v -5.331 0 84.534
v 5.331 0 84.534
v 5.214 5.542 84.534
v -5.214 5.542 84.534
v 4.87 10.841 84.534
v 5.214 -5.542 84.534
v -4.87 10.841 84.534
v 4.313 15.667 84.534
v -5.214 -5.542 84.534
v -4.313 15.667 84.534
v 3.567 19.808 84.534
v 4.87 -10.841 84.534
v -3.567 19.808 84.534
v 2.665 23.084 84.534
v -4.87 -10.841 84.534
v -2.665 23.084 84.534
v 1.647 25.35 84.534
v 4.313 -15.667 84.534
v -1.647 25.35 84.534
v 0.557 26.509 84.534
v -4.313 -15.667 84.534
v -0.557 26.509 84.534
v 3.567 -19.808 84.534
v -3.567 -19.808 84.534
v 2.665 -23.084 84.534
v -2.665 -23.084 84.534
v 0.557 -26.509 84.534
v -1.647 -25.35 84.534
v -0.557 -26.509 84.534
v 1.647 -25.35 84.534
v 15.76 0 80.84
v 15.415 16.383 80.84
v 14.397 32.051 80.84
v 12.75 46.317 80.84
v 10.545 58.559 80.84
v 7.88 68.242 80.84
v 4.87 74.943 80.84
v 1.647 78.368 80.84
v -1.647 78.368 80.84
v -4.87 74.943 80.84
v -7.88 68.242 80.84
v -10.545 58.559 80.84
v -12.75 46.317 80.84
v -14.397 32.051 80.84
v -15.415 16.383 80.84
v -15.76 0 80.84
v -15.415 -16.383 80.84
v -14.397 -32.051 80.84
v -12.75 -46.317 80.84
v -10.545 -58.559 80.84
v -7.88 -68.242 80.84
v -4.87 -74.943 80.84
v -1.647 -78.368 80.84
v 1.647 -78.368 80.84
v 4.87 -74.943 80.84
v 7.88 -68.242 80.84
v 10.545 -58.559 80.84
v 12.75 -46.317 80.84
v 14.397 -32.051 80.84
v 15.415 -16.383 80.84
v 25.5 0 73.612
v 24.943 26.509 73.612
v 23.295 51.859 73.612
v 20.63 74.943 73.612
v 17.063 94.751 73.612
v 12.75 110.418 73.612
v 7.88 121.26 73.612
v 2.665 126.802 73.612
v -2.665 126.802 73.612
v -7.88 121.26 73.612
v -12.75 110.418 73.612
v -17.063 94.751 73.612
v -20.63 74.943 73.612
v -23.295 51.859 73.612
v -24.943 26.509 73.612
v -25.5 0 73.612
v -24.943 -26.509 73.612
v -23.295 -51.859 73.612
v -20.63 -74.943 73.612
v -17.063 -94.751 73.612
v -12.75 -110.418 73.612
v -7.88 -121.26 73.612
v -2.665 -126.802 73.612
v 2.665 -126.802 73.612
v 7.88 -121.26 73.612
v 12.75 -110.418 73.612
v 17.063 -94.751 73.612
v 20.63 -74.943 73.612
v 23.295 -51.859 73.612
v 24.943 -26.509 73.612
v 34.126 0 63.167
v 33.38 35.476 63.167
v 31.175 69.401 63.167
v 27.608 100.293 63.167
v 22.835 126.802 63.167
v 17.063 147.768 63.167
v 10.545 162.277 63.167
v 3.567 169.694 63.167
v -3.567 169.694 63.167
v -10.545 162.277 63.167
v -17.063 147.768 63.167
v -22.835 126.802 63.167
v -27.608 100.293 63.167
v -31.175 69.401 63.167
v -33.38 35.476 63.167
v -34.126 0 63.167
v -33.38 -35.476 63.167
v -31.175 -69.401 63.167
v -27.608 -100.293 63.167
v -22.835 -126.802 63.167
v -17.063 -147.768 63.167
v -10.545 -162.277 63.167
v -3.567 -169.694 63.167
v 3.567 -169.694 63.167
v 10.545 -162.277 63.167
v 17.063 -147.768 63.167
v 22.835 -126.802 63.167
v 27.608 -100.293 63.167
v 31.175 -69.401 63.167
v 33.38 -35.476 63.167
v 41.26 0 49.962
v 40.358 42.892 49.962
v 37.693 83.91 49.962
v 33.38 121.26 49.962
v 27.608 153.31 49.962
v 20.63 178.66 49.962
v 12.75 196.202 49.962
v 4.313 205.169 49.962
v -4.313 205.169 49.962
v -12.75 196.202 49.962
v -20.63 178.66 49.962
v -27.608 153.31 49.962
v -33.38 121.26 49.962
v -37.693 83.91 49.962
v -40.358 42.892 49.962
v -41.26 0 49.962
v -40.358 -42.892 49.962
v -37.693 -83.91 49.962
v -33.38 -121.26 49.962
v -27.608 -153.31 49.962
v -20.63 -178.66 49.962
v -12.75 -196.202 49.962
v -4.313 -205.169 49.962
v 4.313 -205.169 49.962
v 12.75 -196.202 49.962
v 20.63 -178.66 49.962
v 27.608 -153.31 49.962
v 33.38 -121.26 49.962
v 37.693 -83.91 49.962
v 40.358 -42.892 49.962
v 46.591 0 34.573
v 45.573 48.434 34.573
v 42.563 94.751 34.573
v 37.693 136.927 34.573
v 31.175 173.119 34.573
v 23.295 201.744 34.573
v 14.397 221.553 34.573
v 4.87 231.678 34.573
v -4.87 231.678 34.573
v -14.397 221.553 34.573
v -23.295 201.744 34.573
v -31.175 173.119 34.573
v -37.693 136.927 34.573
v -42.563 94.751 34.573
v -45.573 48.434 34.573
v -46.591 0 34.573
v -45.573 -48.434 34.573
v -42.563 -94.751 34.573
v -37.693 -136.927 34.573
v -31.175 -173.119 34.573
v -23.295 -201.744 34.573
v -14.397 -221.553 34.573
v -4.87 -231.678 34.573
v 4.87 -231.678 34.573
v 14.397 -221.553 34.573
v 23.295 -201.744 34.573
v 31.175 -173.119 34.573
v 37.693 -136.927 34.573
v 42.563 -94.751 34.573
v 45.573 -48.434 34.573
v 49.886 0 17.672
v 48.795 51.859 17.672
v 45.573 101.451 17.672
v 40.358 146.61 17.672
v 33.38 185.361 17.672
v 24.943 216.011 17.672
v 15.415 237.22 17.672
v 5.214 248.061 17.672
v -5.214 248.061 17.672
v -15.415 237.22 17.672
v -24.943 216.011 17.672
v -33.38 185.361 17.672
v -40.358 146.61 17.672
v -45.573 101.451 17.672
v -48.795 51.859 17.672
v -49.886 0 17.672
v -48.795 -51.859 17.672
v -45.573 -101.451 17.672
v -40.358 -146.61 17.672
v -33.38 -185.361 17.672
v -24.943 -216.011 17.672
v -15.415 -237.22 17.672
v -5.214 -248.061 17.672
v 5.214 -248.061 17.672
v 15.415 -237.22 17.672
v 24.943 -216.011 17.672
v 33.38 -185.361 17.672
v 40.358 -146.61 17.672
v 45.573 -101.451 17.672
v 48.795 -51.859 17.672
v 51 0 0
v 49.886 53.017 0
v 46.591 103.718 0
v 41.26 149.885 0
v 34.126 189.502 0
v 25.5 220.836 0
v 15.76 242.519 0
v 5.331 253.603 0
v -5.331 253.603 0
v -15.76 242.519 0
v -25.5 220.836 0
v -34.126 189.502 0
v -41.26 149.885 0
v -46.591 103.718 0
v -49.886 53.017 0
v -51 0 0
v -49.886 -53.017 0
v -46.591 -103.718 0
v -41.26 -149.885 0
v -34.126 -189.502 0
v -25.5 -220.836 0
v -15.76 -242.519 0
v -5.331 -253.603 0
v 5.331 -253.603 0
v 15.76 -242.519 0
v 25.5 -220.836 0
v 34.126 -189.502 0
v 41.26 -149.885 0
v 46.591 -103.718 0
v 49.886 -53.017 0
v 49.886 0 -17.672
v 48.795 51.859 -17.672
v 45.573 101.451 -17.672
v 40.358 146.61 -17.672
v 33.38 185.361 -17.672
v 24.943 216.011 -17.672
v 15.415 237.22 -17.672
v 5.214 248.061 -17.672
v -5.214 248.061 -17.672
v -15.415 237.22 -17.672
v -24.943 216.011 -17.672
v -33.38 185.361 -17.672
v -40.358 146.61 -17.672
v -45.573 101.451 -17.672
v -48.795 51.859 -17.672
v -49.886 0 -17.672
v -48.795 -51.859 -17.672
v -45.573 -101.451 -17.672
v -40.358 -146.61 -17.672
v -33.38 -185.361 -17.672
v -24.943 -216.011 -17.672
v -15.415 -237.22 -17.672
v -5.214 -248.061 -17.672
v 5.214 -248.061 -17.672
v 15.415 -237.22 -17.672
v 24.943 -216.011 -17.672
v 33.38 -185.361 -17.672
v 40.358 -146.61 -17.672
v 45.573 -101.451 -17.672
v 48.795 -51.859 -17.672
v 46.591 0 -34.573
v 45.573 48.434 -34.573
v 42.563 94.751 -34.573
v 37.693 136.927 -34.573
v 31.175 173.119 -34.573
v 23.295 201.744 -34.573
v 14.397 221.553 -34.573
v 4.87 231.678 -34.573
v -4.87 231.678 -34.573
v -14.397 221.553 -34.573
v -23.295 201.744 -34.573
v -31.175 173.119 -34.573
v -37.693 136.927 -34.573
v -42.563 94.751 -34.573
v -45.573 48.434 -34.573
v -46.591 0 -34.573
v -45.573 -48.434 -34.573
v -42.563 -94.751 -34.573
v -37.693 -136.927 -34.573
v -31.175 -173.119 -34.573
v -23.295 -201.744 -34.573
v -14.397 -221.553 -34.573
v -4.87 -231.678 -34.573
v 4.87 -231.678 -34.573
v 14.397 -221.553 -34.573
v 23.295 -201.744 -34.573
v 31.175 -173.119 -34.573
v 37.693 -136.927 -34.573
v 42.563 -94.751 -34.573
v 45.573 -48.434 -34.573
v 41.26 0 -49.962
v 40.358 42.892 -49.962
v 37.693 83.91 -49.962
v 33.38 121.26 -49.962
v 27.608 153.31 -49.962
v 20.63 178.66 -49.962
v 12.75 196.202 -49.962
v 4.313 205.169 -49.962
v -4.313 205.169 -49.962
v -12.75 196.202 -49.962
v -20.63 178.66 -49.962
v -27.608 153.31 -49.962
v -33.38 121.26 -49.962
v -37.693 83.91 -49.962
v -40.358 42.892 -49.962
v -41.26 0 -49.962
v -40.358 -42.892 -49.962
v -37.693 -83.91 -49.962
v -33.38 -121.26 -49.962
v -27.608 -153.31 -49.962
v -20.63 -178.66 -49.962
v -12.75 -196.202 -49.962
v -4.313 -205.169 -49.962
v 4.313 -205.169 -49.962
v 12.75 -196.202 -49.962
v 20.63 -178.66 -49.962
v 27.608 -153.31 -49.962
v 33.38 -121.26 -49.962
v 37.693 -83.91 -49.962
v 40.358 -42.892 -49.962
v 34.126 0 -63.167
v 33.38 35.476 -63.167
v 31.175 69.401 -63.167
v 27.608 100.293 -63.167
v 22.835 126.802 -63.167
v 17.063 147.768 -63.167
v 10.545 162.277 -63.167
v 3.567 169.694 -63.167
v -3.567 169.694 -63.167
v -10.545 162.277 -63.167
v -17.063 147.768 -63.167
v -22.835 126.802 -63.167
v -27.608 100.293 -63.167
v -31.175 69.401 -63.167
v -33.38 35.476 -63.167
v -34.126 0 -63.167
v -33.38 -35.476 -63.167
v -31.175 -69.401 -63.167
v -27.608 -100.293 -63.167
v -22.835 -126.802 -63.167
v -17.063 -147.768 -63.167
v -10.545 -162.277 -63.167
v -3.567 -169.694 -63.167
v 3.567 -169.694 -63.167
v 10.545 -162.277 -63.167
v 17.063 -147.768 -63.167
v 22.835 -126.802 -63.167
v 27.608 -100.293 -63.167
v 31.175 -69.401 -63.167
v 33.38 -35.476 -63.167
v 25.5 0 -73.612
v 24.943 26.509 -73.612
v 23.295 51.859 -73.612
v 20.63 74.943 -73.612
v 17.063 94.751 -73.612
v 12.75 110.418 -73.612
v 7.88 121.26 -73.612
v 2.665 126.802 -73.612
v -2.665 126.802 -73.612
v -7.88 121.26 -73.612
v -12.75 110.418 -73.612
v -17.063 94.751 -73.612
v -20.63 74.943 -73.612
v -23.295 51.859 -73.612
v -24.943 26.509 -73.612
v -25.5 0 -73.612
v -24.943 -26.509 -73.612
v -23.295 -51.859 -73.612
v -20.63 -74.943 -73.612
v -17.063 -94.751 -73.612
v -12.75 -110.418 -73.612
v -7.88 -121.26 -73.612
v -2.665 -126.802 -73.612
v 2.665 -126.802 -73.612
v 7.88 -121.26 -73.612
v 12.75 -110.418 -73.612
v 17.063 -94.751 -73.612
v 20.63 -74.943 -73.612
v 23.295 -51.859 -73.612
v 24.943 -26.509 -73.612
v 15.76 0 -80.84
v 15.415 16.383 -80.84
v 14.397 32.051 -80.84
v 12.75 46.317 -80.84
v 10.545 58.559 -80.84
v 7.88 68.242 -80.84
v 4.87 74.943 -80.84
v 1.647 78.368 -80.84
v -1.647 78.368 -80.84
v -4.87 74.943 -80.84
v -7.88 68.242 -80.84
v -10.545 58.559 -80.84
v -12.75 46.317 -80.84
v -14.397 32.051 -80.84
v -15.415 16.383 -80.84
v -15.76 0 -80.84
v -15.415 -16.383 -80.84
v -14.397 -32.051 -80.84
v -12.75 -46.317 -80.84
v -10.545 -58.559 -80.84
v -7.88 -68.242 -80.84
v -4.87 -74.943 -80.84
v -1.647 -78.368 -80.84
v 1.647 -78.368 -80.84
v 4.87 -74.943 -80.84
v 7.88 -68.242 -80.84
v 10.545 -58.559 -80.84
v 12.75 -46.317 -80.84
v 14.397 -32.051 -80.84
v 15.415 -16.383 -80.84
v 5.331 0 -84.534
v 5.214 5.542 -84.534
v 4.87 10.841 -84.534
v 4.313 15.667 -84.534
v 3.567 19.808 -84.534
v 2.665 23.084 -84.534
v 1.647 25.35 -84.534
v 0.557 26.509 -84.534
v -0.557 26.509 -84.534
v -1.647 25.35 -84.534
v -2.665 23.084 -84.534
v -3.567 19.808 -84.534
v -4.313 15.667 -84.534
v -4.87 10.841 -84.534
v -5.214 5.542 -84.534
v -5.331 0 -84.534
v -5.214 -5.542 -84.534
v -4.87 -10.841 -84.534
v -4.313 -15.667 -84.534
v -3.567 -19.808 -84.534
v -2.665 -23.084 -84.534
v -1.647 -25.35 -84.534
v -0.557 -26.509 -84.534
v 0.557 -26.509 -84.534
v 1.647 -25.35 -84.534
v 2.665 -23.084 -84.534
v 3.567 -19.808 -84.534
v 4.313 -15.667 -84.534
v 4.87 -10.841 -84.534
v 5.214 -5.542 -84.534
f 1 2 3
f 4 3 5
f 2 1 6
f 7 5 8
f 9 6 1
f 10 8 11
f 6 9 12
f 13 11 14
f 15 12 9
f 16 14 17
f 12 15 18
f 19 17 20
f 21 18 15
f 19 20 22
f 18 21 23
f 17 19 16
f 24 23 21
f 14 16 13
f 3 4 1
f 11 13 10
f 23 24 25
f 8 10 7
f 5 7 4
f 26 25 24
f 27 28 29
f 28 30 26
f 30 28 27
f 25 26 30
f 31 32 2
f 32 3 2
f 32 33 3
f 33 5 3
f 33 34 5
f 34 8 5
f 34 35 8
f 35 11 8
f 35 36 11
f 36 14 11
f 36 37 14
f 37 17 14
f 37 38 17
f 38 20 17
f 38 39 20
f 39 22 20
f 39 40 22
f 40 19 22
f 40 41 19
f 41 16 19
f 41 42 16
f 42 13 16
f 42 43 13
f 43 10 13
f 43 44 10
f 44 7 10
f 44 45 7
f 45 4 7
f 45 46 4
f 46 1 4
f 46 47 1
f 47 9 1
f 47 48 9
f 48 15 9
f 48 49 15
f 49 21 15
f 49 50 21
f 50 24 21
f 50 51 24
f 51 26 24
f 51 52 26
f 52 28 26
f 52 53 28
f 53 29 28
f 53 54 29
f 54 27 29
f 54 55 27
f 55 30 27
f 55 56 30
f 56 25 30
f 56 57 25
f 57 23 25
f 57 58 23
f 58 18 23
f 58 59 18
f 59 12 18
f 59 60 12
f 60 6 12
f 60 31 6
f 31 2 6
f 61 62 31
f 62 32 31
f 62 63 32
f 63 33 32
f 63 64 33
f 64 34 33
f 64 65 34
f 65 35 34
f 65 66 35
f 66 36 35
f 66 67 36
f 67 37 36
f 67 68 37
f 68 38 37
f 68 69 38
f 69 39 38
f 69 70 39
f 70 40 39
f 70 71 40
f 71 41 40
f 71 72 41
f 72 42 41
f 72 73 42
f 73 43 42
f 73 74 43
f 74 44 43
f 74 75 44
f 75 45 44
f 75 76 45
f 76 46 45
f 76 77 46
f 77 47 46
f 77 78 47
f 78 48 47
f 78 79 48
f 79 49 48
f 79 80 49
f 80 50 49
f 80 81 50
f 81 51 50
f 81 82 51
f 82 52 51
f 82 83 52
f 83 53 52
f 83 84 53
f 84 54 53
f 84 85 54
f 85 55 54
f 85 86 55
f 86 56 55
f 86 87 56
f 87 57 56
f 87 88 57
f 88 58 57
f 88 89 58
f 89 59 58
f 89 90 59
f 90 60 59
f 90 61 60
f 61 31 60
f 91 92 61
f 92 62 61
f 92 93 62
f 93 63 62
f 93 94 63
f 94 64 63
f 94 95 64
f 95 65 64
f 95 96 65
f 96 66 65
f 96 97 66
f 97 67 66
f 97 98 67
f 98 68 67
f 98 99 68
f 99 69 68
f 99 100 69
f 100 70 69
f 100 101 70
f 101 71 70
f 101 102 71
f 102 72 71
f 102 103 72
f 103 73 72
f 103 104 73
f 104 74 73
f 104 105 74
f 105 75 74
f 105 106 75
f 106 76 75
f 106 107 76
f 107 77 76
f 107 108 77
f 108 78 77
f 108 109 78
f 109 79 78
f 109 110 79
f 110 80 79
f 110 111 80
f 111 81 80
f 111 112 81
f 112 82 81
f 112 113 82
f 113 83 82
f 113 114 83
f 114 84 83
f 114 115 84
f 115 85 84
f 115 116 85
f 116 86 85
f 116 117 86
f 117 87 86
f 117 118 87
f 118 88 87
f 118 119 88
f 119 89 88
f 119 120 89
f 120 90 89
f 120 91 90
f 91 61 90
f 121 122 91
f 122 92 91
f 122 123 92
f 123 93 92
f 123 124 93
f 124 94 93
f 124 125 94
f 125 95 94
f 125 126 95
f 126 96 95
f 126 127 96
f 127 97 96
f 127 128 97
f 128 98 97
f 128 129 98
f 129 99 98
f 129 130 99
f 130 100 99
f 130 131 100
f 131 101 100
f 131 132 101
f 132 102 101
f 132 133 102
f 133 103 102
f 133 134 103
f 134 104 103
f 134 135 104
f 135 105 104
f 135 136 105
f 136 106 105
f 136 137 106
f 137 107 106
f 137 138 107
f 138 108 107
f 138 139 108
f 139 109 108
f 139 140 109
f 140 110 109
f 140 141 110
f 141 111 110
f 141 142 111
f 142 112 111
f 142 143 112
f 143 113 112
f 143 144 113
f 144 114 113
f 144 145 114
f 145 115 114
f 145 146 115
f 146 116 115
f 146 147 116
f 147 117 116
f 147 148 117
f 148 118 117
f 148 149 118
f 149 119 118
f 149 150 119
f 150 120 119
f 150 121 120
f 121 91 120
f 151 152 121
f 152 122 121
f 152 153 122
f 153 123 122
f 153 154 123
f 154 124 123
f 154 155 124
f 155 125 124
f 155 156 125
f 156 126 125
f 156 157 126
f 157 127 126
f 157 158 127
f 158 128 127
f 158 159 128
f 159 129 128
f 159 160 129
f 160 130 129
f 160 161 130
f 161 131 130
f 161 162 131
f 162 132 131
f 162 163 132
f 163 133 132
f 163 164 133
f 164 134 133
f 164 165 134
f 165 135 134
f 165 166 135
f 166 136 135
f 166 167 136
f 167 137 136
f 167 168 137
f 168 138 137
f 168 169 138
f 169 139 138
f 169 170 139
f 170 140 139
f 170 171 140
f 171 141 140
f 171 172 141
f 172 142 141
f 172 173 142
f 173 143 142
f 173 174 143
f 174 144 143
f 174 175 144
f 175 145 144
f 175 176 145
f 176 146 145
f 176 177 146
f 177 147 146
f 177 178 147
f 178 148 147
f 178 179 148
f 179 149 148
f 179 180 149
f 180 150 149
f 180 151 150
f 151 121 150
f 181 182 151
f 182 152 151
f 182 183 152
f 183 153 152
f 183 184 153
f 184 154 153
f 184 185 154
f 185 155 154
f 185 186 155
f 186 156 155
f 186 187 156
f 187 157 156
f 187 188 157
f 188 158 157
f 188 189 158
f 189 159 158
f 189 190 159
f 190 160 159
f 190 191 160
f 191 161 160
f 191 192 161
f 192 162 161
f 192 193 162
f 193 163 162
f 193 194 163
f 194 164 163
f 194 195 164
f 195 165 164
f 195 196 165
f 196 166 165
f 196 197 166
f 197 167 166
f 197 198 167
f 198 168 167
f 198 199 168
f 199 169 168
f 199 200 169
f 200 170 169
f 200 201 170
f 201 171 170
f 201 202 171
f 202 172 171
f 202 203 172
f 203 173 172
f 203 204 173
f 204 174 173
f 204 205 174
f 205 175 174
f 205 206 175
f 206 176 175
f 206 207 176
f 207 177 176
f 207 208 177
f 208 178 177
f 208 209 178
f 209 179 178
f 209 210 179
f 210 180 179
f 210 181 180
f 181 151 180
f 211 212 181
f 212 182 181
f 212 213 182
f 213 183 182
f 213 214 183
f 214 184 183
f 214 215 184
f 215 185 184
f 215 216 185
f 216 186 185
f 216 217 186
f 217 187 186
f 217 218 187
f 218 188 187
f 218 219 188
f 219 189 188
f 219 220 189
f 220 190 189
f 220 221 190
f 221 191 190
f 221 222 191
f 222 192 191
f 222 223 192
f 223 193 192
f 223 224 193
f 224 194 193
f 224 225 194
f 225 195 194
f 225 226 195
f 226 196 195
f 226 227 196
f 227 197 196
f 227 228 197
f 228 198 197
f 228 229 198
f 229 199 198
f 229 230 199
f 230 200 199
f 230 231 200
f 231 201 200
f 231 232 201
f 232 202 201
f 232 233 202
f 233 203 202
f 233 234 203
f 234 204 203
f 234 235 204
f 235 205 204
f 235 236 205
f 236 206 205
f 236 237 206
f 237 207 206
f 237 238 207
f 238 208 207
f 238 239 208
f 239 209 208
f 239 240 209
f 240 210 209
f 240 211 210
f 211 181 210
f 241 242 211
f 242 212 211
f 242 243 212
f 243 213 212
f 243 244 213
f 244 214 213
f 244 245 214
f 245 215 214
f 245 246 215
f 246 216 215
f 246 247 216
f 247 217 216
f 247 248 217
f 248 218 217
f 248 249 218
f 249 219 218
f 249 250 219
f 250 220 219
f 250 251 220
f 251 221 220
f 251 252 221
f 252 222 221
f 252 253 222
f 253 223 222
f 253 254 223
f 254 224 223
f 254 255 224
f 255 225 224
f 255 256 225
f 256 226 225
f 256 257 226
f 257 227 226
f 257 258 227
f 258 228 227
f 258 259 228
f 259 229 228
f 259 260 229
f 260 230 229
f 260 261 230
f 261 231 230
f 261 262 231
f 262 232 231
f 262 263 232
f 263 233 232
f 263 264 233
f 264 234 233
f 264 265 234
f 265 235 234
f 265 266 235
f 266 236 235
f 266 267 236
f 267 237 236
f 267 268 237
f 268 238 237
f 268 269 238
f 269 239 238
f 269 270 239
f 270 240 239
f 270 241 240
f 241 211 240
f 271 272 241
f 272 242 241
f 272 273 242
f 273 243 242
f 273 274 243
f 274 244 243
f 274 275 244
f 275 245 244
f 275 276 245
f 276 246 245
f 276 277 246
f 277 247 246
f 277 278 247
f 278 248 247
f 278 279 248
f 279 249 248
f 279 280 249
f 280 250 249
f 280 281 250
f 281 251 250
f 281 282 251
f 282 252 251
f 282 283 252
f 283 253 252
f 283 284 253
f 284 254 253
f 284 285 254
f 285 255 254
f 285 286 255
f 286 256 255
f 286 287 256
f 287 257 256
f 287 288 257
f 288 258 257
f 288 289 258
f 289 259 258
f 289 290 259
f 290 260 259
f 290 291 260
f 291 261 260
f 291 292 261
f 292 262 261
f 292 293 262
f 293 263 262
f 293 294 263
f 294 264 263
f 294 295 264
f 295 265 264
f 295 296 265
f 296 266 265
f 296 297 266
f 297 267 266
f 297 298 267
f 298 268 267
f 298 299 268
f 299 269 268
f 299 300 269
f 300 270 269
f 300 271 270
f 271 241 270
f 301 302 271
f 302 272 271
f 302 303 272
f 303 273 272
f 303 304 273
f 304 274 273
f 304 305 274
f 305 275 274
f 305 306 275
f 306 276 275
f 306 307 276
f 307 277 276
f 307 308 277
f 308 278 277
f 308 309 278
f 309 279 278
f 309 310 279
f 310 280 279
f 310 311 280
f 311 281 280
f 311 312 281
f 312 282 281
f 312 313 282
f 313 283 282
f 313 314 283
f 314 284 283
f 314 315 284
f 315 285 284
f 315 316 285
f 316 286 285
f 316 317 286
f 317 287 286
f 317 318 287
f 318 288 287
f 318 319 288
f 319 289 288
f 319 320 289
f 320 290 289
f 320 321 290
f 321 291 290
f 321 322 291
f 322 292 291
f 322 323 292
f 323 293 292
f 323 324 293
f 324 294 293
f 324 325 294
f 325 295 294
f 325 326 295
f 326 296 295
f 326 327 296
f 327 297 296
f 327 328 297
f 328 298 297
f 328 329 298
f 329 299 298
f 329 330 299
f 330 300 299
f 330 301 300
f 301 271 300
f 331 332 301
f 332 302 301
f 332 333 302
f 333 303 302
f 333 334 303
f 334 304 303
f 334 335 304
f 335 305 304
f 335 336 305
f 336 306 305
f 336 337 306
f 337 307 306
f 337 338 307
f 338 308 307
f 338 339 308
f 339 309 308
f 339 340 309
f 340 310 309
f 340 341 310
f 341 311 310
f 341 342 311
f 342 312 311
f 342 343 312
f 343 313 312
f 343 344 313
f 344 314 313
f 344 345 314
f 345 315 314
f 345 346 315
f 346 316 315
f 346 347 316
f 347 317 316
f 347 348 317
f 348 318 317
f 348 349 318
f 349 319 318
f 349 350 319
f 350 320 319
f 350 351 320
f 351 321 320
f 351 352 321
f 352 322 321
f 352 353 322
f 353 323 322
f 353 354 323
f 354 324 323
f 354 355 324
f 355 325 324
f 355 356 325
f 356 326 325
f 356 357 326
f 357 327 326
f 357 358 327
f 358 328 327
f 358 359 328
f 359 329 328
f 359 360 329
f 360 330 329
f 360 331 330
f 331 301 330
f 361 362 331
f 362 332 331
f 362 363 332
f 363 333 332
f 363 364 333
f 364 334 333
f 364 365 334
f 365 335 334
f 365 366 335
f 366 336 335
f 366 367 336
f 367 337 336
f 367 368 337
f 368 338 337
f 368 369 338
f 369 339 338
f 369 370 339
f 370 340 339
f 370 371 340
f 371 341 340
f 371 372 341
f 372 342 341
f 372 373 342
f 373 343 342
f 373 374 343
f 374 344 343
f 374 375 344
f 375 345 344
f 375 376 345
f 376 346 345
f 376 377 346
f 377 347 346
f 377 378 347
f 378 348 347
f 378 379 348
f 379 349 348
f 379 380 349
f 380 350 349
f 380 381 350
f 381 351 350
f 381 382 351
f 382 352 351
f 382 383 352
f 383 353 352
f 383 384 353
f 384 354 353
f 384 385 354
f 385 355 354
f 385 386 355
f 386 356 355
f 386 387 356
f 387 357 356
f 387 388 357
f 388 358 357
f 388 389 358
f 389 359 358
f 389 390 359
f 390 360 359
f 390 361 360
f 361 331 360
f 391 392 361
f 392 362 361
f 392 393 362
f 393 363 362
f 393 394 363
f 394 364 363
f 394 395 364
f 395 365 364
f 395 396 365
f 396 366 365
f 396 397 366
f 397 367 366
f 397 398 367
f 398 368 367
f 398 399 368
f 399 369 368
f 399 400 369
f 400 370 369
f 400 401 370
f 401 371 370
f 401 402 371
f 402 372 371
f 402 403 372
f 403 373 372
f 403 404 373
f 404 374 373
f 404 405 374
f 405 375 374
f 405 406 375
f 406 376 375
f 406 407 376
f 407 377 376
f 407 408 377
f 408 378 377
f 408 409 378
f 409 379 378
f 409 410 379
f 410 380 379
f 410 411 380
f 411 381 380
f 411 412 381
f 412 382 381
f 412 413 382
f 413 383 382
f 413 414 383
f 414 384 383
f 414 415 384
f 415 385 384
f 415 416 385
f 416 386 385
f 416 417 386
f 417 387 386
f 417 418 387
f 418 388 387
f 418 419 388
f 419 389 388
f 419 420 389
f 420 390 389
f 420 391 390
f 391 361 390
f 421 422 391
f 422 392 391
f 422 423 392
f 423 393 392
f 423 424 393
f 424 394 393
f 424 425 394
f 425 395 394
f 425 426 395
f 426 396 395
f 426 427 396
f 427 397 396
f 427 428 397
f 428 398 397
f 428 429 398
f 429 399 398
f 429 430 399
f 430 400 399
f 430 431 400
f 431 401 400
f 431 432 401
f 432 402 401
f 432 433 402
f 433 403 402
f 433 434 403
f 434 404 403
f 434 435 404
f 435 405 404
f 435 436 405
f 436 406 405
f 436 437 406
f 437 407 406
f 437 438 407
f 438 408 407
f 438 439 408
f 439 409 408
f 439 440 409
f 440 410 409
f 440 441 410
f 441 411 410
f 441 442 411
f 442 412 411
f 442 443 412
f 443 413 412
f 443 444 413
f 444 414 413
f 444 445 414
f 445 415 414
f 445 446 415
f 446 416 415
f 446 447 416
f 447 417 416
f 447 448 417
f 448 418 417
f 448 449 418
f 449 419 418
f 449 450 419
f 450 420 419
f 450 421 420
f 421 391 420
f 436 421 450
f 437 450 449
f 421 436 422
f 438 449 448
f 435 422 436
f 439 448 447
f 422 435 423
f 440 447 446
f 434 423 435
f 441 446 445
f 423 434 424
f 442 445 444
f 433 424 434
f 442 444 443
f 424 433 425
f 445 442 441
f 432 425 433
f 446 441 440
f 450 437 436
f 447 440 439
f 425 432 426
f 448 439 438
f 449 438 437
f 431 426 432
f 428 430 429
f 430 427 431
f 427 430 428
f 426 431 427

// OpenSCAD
// Generated by SolidPython 1.0.1 on 2020-07-29 00:46:45


scale(v = [3, 15, 5]) {
	sphere(r = 17);
}
/***********************************************
*********      SolidPython code:      **********
************************************************
 
# import packages: SolidPython
from solid import *
from solid.utils import *
from itertools import chain, combinations, permutations


class Resize:

    def __init__(self, scad_file):
        self.scad_file = scad_file
        #self.scad_file = import_scad(scad_file)
        # cone/cylinder param:
        self.r1 = 0
        self.r2 = 0
        self.h = 0
        # rectangular prism param:
        self.w = 0
        self.l = 0
        # ellipse param:
        self.r = 0

    # import OpenScad code (file name corresponds to shape)


    # classify shape + parameters
    def assign(self, param1, param2, param3):
        if self.scad_file == 'cone.scad':
            self.r1 = param1
            self.r2 = param2
            self.h = param3
        elif self.scad_file == 'cylinder.scad':
            self.r1 = param1
            self.r2 = param2
            self.h = param3
        elif self.scad_file == 'rectangularPrism.scad':
            self.h = param1
            self.l = param2
            self.w = param3
        else:
            self.r = param1
            self.h = param2

    # resize parameters
    def iterate(self):
        x = range(3, 20, 2)
        i = 1
        if self.scad_file == 'cone.scad':
            tempList = list(permutations(x, 2))
            for temp in tempList:
                param1 = temp[0]
                param2 = temp[1]
                filepath = 'produced_scad_files/' + 'cone' + str(param1) + '_' + str(param2) + '_' + '.scad'
                scad_render_to_file(cylinder(h=param1, r1=param2, r2=0), filepath)

        elif self.scad_file == 'cylinder.scad':
            tempList = list(permutations(x, 3))
            for temp in tempList:
                param1 = temp[0]
                param2 = temp[1]
                filepath = 'produced_scad_files/' + 'cylinder' + str(param1) + '_' + str(param2) + '_' + '.scad'
                scad_render_to_file(cylinder(h=param1, r1=param2, r2=param2), filepath)

        elif self.scad_file == 'rectangularPrism.scad':
            tempList = list(permutations(x, 3))
            for temp in tempList:
                param1 = temp[0]
                param2 = temp[1]
                param3 = temp[2]
                filepath = 'produced_scad_files/' + 'rectangularPrism' + str(param1) + '_' + str(param2) + '_' + str(
                    param3) + '.scad'
                scad_render_to_file(cube(size=(param1, param2, param3)), filepath)

        elif self.scad_file == 'ellipse.scad':
            tempList = list(permutations(x, 4))
            for temp in tempList:
                param1 = temp[0]
                param2 = temp[1]
                param3 = temp[2]
                param4 = temp[3]
                filepath = 'produced_scad_files/' + 'ellipse' + str(param1) + '_' + str(param2) + '_' + str(param3) + '_' + str(param4) + '.scad'
                scad_render_to_file(scale([param1, param2, param3])(sphere(r=param4)), filepath)

    def render_to_scadfile(self):
        scad_render_to_file(scad, 'example.scad') 
 
************************************************/
